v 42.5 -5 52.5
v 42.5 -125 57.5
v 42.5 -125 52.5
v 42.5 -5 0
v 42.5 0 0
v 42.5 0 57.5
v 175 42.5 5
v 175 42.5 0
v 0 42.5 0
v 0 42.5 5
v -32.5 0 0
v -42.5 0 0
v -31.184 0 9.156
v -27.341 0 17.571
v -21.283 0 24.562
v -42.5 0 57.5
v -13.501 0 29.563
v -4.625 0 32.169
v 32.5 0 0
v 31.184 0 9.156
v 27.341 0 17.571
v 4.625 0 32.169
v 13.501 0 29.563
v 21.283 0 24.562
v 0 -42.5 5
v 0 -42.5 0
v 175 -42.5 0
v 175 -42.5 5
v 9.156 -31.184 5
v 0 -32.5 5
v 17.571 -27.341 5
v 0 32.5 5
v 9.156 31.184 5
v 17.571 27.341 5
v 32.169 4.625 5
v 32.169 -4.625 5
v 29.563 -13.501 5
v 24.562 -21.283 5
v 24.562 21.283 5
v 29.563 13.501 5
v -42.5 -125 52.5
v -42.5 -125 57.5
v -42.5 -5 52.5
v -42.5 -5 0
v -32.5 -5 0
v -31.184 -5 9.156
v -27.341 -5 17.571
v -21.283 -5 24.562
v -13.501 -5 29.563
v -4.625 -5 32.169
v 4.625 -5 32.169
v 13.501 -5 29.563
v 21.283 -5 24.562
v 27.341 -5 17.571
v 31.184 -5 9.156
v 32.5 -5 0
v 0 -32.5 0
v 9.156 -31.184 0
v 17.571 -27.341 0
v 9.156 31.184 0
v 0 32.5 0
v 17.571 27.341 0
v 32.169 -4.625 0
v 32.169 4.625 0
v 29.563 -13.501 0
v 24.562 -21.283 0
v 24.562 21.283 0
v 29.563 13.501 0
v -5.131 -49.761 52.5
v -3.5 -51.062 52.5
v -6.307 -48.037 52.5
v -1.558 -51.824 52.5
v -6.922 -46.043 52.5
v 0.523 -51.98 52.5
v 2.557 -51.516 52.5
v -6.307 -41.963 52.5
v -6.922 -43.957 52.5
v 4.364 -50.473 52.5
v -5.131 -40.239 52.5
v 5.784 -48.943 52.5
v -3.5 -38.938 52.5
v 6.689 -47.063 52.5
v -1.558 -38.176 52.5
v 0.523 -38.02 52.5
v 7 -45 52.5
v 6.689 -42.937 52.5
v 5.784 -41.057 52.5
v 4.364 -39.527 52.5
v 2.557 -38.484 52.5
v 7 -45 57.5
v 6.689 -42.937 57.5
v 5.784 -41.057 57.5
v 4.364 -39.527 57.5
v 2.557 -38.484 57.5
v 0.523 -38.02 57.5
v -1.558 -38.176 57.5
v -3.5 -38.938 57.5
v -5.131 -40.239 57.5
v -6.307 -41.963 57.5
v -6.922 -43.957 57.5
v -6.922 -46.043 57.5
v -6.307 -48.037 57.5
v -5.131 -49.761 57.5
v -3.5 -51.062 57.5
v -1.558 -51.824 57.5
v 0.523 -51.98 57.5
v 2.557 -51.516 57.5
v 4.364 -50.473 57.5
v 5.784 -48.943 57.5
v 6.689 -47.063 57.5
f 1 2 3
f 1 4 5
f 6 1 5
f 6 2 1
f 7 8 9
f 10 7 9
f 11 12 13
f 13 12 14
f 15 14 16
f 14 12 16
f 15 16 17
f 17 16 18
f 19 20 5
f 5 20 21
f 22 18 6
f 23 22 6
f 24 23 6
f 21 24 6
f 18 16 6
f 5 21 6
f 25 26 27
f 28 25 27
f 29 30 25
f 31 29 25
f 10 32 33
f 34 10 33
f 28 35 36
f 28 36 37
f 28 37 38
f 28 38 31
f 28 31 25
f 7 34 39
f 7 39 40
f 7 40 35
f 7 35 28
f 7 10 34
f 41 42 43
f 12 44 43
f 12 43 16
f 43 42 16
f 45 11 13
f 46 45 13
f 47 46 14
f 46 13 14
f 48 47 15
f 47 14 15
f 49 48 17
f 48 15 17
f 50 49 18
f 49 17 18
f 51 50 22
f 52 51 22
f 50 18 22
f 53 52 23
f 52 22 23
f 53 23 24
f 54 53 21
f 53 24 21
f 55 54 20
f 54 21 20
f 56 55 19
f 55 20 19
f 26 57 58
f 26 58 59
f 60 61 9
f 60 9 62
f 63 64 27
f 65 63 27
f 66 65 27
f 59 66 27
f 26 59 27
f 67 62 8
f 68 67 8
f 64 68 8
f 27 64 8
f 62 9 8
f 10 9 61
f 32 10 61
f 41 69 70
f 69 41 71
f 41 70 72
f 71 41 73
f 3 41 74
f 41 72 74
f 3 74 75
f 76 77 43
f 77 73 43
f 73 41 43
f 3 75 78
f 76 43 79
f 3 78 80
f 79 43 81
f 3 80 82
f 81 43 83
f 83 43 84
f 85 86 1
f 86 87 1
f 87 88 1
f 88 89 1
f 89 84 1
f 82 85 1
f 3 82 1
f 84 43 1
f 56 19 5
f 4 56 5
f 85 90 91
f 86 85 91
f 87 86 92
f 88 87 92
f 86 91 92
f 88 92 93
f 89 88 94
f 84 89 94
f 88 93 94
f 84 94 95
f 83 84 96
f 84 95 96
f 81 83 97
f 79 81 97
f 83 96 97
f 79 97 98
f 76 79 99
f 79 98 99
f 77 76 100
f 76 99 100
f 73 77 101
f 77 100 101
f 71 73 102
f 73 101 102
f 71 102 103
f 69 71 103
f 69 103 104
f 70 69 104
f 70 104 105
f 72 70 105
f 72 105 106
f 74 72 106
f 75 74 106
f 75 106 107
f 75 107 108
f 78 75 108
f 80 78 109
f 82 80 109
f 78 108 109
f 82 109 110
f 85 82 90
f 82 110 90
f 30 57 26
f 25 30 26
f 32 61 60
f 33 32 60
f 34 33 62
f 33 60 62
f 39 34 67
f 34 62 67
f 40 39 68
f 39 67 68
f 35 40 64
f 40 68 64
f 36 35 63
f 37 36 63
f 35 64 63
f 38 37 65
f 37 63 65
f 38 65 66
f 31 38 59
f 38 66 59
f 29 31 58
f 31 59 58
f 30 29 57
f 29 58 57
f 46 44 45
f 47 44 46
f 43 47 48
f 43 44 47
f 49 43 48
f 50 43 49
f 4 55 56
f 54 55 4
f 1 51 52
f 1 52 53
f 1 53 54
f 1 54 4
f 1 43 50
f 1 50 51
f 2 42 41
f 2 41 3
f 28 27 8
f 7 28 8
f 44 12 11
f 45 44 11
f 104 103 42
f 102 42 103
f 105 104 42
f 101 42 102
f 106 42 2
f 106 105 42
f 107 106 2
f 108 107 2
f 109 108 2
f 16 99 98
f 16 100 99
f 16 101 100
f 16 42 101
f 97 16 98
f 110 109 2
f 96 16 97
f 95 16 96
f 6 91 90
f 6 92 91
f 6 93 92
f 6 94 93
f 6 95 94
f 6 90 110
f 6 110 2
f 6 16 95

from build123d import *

# Parameters (mm, degrees)
F1_DEPTH = 5
F2_W     = 85
F2_H     = 125
F2_R     = 7
F3_DEPTH = 5
F5_DEPTH = 5


with BuildPart() as f1:
    # F0 (on Front) → F1 (new body)
    with BuildSketch(Plane.XZ):
        with BuildLine():
            ThreePointArc((-32.5, 0), (0, 32.5), (32.5, 0))
            Line((32.5, 0), (42.5, 0))
            Line((42.5, 0), (42.5, 57.5))
            Line((42.5, 57.5), (-42.5, 57.5))
            Line((-42.5, 57.5), (-42.5, 0))
            Line((-42.5, 0), (-32.5, 0))
        make_face()
    extrude(amount=F1_DEPTH)

    # F2 (on face) → F3 (join)
    with BuildSketch(Plane.XY.offset(57.5)):
        with Locations((0, -62.5)):
            Rectangle(F2_W, F2_H)
        with Locations((0, -45)):
            Circle(F2_R, mode=Mode.SUBTRACT)
    extrude(amount=-F3_DEPTH)


with BuildPart() as f5:
    # F4 (on Top) → F5 (new body)
    with BuildSketch(Plane.XY):
        with BuildLine():
            ThreePointArc((0, 32.5), (32.5, 0), (0, -32.5))
            Line((0, -32.5), (0, -42.5))
            Line((0, -42.5), (175, -42.5))
            Line((175, -42.5), (175, 42.5))
            Line((175, 42.5), (0, 42.5))
            Line((0, 42.5), (0, 32.5))
        make_face()
    extrude(amount=F5_DEPTH)


solid = Compound([f1.part, f5.part])
